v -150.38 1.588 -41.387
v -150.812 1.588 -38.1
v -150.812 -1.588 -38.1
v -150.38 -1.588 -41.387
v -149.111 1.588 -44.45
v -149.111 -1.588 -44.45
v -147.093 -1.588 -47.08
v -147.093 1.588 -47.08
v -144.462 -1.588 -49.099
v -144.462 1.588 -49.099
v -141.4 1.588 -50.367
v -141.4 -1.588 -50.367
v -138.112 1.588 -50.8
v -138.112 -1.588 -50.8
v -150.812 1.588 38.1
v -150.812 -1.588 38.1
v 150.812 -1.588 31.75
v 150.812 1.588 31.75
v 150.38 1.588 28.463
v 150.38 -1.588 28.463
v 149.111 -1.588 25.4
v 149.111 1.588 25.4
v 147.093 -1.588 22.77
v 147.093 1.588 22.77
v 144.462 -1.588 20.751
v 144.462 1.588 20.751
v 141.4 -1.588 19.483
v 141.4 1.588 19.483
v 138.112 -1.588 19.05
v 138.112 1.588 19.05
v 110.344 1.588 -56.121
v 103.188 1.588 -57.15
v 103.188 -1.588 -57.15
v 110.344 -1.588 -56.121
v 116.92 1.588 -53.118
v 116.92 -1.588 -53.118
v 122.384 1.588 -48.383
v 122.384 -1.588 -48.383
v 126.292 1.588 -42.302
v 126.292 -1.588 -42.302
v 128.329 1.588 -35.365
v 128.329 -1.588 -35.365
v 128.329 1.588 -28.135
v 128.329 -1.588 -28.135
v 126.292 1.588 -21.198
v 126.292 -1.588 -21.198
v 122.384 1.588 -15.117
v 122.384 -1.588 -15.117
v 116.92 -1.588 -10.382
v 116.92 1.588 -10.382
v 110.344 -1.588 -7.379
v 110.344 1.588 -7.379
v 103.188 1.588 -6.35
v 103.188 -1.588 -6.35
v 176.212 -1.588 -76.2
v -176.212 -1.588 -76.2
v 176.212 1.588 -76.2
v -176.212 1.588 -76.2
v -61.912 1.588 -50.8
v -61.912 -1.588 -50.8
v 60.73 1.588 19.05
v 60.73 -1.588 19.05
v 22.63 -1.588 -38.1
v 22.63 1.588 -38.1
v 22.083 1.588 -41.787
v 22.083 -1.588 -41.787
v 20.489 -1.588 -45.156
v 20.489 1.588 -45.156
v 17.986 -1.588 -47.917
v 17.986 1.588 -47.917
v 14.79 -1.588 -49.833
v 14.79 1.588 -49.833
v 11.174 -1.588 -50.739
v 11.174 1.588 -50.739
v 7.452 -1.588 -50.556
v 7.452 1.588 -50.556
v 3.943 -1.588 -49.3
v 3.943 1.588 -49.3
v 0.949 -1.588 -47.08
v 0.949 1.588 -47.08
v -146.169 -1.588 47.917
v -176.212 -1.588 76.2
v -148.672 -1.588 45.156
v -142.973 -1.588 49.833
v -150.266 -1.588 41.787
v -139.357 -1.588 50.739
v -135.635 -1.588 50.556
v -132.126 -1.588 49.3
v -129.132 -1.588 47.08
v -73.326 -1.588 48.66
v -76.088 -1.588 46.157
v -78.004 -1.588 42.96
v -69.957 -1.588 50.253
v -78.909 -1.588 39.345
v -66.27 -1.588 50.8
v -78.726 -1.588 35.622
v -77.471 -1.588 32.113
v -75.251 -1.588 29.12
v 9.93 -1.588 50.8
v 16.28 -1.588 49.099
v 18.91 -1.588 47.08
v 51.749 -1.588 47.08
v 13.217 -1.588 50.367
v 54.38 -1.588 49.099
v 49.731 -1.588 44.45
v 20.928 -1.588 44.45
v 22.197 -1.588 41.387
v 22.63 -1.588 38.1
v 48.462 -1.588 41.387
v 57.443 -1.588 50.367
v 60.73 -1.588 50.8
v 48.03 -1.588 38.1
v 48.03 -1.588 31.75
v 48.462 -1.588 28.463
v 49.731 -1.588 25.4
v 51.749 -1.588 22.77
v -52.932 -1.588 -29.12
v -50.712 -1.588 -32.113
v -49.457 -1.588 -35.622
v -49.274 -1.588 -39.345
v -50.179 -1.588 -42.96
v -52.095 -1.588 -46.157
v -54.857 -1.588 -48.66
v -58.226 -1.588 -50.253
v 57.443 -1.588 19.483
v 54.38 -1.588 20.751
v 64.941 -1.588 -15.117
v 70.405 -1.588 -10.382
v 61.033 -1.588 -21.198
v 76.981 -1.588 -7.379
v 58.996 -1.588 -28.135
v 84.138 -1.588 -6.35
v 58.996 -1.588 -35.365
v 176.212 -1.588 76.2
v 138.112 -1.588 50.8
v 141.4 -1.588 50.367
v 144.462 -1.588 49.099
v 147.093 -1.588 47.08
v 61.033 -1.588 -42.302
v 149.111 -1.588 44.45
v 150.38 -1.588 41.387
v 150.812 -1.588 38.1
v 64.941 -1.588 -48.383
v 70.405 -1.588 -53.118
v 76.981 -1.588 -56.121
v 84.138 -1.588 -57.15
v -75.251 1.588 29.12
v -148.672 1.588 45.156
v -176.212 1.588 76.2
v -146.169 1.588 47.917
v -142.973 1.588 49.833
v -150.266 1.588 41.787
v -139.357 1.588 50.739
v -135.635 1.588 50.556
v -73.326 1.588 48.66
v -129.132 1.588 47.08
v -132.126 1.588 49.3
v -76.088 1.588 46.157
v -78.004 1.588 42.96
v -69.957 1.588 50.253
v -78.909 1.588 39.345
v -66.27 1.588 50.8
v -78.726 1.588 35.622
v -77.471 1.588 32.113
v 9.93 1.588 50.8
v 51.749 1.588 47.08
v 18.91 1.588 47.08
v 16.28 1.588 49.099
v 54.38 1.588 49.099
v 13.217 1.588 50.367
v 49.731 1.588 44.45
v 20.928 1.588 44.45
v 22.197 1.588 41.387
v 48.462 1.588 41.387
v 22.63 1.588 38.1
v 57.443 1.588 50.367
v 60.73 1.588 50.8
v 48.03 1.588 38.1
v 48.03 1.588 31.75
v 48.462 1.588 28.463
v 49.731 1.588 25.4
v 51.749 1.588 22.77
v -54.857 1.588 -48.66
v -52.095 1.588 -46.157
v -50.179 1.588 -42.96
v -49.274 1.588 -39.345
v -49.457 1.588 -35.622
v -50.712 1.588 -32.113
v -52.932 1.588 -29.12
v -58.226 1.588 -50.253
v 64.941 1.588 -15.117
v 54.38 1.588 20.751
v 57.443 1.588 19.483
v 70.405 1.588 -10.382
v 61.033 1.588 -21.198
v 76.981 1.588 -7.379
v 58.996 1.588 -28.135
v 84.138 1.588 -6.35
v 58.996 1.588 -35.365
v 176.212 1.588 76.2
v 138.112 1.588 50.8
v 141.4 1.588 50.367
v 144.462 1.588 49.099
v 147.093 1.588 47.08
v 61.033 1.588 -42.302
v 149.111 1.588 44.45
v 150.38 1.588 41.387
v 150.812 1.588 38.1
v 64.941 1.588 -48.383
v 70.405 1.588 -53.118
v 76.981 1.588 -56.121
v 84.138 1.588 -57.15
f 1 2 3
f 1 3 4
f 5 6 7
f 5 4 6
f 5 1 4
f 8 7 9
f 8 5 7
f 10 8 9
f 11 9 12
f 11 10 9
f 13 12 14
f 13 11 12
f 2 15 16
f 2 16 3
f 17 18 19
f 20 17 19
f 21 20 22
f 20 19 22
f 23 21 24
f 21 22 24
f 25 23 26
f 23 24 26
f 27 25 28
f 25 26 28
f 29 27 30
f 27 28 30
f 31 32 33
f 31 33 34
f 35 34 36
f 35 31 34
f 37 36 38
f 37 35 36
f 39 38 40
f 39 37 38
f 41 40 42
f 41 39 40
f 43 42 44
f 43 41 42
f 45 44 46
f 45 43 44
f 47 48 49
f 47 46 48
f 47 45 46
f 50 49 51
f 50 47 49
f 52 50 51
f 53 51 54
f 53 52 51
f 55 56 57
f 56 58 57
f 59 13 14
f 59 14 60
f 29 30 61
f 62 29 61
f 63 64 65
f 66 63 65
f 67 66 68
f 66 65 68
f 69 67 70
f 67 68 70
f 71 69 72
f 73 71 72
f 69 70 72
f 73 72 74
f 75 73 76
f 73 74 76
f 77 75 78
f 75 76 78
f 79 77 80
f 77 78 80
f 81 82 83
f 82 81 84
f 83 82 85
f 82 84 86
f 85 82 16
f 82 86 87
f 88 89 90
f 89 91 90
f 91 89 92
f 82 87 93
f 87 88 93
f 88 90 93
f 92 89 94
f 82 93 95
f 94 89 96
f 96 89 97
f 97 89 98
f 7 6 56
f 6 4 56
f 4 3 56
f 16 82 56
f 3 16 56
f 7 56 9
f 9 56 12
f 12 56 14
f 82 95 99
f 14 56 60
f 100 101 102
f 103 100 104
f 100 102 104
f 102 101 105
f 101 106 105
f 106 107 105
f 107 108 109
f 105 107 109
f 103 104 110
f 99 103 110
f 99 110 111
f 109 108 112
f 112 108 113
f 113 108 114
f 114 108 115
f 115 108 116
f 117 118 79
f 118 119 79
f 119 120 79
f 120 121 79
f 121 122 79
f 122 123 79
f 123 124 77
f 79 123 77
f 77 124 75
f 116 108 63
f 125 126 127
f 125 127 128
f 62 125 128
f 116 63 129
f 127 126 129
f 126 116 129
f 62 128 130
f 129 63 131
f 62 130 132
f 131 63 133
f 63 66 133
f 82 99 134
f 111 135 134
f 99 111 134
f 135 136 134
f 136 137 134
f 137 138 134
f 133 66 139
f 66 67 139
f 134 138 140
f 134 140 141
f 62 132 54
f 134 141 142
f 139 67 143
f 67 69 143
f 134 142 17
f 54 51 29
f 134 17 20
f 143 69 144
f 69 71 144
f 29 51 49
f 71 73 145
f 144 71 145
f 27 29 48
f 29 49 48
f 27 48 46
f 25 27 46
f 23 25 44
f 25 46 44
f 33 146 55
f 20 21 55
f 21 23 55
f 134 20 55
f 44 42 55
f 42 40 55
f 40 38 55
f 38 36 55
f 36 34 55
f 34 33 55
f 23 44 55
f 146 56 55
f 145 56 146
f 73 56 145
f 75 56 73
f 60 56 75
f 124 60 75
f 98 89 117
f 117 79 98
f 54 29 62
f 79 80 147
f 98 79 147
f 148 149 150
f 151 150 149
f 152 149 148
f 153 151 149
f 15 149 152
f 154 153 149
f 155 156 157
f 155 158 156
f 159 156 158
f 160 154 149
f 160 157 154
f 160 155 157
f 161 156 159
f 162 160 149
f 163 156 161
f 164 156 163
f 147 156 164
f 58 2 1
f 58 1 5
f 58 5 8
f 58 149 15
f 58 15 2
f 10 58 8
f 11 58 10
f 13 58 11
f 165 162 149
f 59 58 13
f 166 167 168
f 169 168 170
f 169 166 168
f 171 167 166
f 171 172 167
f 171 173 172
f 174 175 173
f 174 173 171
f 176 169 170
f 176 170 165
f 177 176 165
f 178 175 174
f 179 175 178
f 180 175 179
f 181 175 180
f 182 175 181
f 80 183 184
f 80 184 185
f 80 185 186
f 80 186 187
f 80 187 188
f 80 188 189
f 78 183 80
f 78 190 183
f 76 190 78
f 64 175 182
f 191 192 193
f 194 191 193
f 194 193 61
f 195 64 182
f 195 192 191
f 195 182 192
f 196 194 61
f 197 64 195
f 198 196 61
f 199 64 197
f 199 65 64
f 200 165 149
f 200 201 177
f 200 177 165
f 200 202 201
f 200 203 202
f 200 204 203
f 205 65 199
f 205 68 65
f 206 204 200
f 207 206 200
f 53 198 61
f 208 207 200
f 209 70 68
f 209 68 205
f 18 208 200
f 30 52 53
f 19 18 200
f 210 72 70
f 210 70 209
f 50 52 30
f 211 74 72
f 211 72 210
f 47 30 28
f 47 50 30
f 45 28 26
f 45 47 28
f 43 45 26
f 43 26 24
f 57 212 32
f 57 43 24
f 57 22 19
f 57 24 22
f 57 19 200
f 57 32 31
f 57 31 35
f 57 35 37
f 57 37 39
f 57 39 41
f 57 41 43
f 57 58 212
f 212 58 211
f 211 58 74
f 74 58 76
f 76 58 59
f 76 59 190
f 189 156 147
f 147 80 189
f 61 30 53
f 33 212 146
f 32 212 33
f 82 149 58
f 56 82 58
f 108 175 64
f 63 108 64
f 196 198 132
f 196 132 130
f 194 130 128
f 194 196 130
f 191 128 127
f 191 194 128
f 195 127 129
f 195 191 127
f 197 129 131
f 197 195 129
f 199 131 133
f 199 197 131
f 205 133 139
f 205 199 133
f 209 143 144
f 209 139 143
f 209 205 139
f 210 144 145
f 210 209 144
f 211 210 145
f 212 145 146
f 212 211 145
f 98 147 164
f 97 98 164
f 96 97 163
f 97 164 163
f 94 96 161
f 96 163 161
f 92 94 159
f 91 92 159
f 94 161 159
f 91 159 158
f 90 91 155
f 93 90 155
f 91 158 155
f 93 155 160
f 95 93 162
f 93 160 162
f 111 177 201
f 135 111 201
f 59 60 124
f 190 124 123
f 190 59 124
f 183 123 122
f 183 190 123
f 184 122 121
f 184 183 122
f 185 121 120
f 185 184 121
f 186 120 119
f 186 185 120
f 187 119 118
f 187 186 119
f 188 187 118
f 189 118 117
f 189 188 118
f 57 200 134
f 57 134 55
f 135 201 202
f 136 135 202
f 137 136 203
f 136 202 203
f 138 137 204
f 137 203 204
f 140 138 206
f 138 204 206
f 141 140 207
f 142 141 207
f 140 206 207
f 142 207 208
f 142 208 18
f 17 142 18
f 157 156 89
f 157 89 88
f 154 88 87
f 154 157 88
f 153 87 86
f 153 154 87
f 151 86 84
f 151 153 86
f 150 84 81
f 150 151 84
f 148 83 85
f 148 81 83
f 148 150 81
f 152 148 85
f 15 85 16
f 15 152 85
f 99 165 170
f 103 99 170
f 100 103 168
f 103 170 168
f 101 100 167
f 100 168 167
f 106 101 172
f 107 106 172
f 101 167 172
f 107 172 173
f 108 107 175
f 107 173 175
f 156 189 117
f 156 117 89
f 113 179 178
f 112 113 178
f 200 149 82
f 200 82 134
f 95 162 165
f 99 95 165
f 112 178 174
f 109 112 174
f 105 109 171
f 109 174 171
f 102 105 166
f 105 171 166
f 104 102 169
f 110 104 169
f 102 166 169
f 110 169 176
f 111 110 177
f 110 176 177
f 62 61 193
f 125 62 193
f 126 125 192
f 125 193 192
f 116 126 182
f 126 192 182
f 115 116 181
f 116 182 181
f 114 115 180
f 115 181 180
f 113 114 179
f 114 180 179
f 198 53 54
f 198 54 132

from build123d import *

# Parameters (mm, degrees)
SKETCH1_W           = 352.425
SKETCH1_H           = 152.4
BOSS_EXTRUDE1_DEPTH = 1.5875
CUT_EXTRUDE1_DEPTH  = 4.175


with BuildPart() as part:
    # Sketch1 → Boss-Extrude1 (new body, symmetric)
    with BuildSketch(Plane(origin=(0, 0, 0), x_dir=(1, 0, 0), z_dir=(0, 1, 0))):
        Rectangle(SKETCH1_W, SKETCH1_H)
    extrude(amount=BOSS_EXTRUDE1_DEPTH, both=True)

    # Sketch2 → Cut-Extrude1 (cut, through all)
    with BuildSketch(Plane(origin=(0, 1.5875, 0), x_dir=(1, 0, 0), z_dir=(0, 1, 0))):
        with BuildLine():
            Line((103.1875, 6.35), (84.1375, 6.35))
            ThreePointArc((84.1375, 6.35), (58.7375, 31.75), (84.1375, 57.15))
            Line((84.1375, 57.15), (103.1875, 57.15))
            ThreePointArc((103.1875, 57.15), (128.5875, 31.75), (103.1875, 6.35))
        make_face()
        with BuildLine():
            Line((-138.1125, 50.8), (-61.9125, 50.8))
            ThreePointArc((-61.9125, 50.8), (-50.179229937, 42.960079591), (-52.932243879, 29.119743879))
            Line((-52.932243879, 29.119743879), (-129.132243879, -47.080256121))
            ThreePointArc((-129.132243879, -47.080256121), (-142.972579591, -49.833270063), (-150.8125, -38.1))
            Line((-150.8125, -38.1), (-150.8125, 38.1))
            ThreePointArc((-150.8125, 38.1), (-147.092756121, 47.080256121), (-138.1125, 50.8))
        make_face()
        with BuildLine():
            Line((-66.270451031, -50.8), (9.929548969, -50.8))
            ThreePointArc((9.929548969, -50.8), (18.90980509, -47.080256121), (22.629548969, -38.1))
            Line((22.629548969, -38.1), (22.629548969, 38.1))
            ThreePointArc((22.629548969, 38.1), (14.78962856, 49.833270063), (0.949292847, 47.080256121))
            Line((0.949292847, 47.080256121), (-75.250707153, -29.119743879))
            ThreePointArc((-75.250707153, -29.119743879), (-78.003721094, -42.960079591), (-66.270451031, -50.8))
        make_face()
        with BuildLine():
            Line((60.729548969, -50.8), (138.1125, -50.8))
            ThreePointArc((138.1125, -50.8), (147.092756121, -47.080256121), (150.8125, -38.1))
            Line((150.8125, -38.1), (150.8125, -31.75))
            ThreePointArc((150.8125, -31.75), (147.092756121, -22.769743879), (138.1125, -19.05))
            Line((138.1125, -19.05), (60.729548969, -19.05))
            ThreePointArc((60.729548969, -19.05), (51.749292847, -22.769743879), (48.029548969, -31.75))
            Line((48.029548969, -31.75), (48.029548969, -38.1))
            ThreePointArc((48.029548969, -38.1), (51.749292847, -47.080256121), (60.729548969, -50.8))
        make_face()
    extrude(amount=-CUT_EXTRUDE1_DEPTH, mode=Mode.SUBTRACT)


solid = part.part
